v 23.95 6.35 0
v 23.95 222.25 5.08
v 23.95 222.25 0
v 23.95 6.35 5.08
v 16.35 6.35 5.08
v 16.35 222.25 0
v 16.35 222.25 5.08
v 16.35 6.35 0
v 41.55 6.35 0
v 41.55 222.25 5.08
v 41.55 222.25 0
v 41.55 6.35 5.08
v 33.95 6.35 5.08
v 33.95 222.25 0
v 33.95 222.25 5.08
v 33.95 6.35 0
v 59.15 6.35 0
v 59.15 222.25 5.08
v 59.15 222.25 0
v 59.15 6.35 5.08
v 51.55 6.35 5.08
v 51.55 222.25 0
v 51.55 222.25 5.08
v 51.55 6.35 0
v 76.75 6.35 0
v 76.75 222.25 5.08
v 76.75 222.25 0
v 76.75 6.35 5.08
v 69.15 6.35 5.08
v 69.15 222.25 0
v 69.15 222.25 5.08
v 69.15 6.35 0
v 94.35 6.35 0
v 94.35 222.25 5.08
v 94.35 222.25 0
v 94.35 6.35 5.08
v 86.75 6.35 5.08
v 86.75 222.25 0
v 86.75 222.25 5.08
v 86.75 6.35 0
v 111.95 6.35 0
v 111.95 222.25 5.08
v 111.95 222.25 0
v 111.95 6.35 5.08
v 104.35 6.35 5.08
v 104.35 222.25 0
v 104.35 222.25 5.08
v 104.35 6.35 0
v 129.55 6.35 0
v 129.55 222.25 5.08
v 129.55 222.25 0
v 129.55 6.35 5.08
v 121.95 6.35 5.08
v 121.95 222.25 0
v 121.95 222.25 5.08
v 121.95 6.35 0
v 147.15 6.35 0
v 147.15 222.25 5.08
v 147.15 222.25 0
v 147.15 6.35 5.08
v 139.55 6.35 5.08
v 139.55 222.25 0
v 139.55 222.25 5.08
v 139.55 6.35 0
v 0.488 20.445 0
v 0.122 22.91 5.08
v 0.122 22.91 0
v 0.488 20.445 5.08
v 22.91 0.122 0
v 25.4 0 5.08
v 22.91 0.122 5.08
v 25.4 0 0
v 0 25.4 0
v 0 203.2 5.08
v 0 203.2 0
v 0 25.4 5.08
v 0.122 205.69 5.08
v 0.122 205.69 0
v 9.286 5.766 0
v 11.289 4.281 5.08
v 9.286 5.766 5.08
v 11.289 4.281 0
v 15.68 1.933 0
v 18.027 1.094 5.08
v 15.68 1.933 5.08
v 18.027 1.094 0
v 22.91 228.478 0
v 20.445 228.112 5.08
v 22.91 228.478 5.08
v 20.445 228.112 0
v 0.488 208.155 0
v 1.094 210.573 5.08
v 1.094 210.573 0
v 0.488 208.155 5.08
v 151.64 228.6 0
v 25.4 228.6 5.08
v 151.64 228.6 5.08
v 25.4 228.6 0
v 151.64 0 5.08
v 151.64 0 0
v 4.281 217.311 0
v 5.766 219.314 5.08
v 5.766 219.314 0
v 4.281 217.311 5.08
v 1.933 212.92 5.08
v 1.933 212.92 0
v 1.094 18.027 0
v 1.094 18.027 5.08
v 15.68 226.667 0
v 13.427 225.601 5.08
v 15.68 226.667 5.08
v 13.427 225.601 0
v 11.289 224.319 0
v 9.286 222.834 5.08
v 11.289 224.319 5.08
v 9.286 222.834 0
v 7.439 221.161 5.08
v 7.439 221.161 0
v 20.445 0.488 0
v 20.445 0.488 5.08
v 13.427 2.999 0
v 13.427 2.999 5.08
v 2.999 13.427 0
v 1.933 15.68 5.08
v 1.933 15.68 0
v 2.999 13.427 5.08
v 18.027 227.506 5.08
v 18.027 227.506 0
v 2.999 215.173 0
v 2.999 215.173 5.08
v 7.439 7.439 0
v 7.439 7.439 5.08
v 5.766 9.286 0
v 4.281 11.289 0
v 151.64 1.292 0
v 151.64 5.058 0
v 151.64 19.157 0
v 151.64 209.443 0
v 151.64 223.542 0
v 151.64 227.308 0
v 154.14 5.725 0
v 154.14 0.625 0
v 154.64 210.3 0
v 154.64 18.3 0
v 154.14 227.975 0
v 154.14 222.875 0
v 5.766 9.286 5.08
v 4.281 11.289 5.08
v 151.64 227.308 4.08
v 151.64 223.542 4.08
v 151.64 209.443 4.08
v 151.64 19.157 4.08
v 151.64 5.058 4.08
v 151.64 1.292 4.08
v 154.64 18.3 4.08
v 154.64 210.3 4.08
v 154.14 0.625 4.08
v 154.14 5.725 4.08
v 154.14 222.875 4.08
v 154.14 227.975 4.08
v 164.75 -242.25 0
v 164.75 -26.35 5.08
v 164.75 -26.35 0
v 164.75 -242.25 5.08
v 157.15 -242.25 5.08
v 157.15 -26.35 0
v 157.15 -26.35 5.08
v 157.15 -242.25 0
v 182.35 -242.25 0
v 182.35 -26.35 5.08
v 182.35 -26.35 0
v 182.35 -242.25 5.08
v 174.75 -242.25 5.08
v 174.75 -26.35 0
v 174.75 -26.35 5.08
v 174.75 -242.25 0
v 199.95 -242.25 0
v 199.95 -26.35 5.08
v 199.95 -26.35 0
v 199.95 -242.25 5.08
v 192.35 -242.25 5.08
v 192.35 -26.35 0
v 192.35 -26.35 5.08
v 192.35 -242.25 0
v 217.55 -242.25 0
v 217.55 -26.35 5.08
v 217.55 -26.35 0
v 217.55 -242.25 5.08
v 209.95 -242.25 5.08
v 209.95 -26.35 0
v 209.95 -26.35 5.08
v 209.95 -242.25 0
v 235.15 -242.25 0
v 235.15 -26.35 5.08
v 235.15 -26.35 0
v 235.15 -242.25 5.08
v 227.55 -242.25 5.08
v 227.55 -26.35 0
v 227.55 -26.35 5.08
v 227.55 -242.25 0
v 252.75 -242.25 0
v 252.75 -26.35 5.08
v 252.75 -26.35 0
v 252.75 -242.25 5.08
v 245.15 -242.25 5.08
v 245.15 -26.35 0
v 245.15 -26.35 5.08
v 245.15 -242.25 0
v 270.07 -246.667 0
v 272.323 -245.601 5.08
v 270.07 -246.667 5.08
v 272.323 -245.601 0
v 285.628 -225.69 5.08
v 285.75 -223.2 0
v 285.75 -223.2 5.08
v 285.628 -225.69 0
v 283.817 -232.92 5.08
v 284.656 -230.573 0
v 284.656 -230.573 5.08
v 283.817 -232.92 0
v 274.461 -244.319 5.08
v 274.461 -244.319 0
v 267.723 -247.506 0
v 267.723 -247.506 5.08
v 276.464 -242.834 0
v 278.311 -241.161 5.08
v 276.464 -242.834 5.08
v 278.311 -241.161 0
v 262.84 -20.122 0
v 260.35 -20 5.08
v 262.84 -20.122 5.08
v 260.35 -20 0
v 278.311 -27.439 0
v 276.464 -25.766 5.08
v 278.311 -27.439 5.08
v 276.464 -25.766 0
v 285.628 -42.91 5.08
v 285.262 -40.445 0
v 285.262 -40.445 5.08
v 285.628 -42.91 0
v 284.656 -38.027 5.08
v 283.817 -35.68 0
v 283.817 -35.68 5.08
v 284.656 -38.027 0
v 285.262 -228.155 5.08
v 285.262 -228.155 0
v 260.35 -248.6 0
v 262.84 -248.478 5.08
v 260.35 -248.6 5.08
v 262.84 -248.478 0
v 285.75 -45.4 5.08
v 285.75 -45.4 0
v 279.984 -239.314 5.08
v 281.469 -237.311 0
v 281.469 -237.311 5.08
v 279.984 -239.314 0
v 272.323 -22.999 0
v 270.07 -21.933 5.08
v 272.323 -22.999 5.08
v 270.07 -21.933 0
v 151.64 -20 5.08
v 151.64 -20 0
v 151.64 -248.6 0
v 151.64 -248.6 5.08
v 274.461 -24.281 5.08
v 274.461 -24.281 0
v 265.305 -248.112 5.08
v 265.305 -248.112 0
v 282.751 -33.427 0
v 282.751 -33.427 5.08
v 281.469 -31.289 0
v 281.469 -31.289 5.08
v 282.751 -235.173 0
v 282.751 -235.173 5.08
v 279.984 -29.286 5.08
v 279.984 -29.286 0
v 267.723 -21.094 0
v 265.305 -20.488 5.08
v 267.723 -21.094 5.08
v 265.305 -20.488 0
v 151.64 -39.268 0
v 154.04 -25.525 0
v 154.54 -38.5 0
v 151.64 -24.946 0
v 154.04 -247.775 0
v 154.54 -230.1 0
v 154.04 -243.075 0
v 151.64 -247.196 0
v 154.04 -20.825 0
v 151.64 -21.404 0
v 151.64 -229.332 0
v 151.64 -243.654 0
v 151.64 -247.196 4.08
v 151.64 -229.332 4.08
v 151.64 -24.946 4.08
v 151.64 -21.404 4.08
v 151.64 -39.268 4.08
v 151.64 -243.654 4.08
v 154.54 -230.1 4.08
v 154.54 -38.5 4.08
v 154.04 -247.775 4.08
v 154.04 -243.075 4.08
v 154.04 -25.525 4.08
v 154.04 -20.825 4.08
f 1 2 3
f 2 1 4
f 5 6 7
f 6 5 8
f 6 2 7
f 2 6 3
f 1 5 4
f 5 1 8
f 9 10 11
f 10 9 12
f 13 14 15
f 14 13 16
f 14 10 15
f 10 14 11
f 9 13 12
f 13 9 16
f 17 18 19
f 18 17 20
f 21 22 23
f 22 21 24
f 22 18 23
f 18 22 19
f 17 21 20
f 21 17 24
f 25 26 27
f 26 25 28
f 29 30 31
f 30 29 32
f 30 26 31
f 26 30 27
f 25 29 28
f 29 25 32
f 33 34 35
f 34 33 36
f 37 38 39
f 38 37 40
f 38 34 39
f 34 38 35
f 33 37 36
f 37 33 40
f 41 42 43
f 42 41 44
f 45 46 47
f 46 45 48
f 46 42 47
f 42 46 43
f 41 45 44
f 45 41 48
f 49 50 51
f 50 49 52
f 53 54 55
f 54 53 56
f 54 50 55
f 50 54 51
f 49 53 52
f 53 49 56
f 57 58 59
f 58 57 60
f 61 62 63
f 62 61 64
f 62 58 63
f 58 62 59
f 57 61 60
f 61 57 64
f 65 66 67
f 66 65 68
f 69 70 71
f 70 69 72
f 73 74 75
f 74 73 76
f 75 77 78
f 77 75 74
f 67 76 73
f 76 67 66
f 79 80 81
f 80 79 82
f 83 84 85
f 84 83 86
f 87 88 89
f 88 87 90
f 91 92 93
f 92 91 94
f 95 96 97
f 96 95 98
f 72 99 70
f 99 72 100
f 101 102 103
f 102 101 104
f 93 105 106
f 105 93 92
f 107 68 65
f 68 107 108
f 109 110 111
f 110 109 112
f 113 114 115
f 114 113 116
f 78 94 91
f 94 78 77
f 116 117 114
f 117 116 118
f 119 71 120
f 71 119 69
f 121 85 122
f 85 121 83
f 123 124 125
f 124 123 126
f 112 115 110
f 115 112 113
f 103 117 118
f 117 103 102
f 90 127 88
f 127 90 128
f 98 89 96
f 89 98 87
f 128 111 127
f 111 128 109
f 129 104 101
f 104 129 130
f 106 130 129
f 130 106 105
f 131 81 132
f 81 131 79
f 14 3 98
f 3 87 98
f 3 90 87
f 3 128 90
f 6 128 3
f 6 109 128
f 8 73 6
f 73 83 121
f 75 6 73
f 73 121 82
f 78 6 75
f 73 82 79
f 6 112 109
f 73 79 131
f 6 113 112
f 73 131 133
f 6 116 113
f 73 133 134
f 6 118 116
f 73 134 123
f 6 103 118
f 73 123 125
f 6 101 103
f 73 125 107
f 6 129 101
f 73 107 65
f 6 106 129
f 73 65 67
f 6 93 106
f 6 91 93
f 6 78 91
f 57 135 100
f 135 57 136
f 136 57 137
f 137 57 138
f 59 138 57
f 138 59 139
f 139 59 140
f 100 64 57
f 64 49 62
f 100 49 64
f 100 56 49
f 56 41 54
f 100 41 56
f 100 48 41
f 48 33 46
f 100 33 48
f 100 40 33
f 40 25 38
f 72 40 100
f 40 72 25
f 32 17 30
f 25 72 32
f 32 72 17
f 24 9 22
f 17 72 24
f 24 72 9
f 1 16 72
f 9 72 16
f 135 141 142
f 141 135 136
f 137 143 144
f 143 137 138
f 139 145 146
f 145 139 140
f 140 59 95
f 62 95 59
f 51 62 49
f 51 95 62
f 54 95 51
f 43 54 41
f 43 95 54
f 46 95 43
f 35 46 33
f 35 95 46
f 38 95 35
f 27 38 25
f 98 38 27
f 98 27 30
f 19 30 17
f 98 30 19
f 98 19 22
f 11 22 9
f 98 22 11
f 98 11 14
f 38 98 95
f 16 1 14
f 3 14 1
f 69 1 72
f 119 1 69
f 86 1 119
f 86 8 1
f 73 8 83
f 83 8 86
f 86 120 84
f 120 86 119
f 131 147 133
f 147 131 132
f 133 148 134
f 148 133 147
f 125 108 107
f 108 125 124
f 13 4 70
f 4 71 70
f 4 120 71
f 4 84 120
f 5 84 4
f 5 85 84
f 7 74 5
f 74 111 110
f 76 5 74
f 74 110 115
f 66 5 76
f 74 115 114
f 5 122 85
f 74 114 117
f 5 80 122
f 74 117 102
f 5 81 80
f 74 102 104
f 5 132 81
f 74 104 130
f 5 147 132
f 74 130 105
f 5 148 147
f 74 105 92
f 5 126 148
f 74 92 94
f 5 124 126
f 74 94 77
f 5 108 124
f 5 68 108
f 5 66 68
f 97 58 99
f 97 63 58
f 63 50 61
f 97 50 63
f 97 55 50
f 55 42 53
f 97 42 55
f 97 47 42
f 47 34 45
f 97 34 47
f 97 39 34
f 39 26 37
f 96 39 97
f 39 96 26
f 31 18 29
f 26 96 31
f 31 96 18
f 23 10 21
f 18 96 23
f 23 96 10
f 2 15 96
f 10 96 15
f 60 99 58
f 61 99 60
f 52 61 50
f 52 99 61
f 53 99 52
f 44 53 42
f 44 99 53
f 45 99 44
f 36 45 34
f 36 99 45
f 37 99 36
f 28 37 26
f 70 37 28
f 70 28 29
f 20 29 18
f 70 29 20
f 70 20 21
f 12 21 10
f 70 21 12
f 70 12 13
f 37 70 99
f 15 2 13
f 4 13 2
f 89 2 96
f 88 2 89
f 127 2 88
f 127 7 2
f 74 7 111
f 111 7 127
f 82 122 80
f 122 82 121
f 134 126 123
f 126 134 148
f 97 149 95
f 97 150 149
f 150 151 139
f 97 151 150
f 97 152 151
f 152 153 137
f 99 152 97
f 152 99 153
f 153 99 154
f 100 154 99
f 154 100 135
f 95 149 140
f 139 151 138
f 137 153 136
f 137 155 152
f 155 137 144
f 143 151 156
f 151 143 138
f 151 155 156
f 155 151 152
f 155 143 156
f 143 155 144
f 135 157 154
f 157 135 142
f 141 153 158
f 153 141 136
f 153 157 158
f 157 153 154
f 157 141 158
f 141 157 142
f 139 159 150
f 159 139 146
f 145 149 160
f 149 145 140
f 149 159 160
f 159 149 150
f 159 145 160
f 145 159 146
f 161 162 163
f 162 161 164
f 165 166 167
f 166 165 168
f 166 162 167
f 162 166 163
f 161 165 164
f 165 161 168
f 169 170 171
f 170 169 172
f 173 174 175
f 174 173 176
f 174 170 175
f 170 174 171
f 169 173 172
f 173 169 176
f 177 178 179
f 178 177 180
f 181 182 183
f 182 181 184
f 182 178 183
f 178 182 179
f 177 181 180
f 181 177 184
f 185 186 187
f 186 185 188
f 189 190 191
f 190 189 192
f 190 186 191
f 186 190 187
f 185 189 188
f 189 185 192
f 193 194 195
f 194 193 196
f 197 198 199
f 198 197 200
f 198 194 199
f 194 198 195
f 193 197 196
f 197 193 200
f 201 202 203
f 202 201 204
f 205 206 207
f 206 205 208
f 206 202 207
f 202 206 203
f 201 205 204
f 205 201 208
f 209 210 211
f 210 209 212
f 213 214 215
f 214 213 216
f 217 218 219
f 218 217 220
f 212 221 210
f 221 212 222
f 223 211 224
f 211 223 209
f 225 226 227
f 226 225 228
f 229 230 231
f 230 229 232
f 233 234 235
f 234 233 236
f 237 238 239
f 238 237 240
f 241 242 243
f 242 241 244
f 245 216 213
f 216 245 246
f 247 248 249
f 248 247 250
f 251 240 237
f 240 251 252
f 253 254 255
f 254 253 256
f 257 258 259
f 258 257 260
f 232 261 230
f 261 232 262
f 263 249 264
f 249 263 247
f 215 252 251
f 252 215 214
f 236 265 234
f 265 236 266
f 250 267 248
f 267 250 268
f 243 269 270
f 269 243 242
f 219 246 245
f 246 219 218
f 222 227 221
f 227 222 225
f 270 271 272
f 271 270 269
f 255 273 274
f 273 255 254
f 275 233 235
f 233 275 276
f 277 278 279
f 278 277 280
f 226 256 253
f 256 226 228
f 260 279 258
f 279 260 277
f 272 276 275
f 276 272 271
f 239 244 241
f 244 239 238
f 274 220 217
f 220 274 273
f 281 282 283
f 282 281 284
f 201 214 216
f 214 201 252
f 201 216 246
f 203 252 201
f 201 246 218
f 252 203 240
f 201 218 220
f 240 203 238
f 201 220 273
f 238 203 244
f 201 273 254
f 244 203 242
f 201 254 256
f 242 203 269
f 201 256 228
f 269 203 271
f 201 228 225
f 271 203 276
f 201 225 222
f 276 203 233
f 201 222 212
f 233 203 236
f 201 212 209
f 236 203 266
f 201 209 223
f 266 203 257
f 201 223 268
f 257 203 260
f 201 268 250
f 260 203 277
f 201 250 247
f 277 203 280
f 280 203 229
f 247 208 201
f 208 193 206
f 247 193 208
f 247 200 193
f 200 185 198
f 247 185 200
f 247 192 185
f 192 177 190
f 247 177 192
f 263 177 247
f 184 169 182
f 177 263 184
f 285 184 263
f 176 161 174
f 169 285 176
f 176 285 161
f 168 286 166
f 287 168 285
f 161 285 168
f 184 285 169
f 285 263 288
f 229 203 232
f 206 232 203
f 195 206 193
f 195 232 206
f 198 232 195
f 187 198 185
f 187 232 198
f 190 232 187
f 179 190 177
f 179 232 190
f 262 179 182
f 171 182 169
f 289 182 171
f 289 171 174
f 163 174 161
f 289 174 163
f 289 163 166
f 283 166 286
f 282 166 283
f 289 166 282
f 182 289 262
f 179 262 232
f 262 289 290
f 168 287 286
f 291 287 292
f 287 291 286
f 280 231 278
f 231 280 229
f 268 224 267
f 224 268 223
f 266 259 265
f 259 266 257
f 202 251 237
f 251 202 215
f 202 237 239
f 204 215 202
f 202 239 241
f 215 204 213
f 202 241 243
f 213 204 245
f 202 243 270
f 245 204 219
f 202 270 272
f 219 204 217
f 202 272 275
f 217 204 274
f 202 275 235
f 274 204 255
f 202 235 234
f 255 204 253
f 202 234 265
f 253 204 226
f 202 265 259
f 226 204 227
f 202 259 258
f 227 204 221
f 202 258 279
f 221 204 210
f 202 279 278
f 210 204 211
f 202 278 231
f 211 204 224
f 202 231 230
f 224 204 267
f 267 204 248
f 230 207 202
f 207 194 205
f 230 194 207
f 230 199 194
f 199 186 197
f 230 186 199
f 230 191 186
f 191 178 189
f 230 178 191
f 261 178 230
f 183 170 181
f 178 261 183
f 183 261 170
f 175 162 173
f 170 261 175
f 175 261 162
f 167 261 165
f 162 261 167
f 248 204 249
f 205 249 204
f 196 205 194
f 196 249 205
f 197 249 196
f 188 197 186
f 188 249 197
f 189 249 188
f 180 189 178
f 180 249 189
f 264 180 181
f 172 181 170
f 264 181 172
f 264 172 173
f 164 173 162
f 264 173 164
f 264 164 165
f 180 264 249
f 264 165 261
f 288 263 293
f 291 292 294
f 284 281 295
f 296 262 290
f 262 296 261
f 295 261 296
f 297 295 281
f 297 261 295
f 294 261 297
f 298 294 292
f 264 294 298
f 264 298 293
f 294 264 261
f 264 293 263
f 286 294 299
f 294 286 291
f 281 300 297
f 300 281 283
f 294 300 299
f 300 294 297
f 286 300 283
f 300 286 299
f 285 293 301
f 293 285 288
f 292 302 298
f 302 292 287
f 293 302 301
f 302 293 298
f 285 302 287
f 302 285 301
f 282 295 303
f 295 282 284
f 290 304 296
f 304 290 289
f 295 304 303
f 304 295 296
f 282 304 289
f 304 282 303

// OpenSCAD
// file: model-forge/model-forge/tray.scad
// model-forge/tray.scad — rounded-corner outer panel with a recessed
// inset pocket (e.g. a "cooking dish" recess): a raised rim around the
// edge, floor thickness under the pocket, and an optional thin lip
// flange around the base — sized to slide into a support-rail groove
// (like the wooden rails inside the real Tiny Land oven cavity) rather
// than just resting loose.
//
//   use <model-forge/tray.scad>
//   rounded_tray(outer_width=285.75, outer_height=228.6, corner_radius=25.4,
//                floor_thickness=5.08, rim_height=3.81, inset_margin=6.35,
//                lip_width=3, lip_thickness=2);
//
// Shape: outer_width x outer_height slab, rounded corners (corner_radius),
// total height = floor_thickness + rim_height. A pocket is cut from the
// top, inset_margin in from every edge, cutting down through rim_height
// and stopping at floor_thickness from the bottom — so floor_thickness is
// what's left under the pocket, rim_height is how tall the surrounding
// wall stands above the pocket floor.
//
// The lip (lip_width/lip_thickness) is a thin flange at the TOP of the
// rim (from total_height-lip_thickness to total_height), sticking out
// lip_width beyond the main body on every side — corrected 2026-09-11
// per feedback on the real rail photo: the groove is near the top of the
// cavity wall, not the bottom. Both default to 0 (no lip) so existing
// calls keep working unchanged.

// hull-of-4-circles rounded rect — much faster to render than a
// minkowski-based approach for this shape (no minkowski sum needed).
module rounded_rect_2d(w, h, r) {
  hull() {
    translate([r, r]) circle(r = r, $fn = 64);
    translate([w - r, r]) circle(r = r, $fn = 64);
    translate([r, h - r]) circle(r = r, $fn = 64);
    translate([w - r, h - r]) circle(r = r, $fn = 64);
  }
}

module rounded_tray(
  outer_width,
  outer_height,
  corner_radius,
  floor_thickness,
  rim_height,
  inset_margin,
  lip_width = 0,
  lip_thickness = 0
) {
  total_height = floor_thickness + rim_height;

  union() {
    if (lip_width > 0 && lip_thickness > 0) {
      translate([-lip_width, -lip_width, total_height - lip_thickness])
        linear_extrude(height = lip_thickness)
          rounded_rect_2d(outer_width + 2 * lip_width, outer_height + 2 * lip_width, corner_radius + lip_width);
    }
    difference() {
      linear_extrude(height = total_height)
        rounded_rect_2d(outer_width, outer_height, corner_radius);
      translate([inset_margin, inset_margin, floor_thickness])
        cube([outer_width - 2 * inset_margin, outer_height - 2 * inset_margin, rim_height + 1]);
    }
  }
}
// file: model-forge/joint.scad
// model-forge/joint.scad — dovetail finger-joint tabs for snap-fit panel
// segmentation. One segment gets protruding tabs (union onto its edge),
// the matching segment gets slightly-larger slots (difference cut into
// its edge) so the two press together with a light interference/snap fit.
//
// Both modules produce a 2D profile running along the X axis, centered
// on the boundary line (y=0), for a boundary of the given edge_length.
// The caller extrudes and positions/rotates it onto the actual seam
// (see back-wall-joint-test.scad for a worked example on a vertical seam).
//
//   use <model-forge/joint.scad>
//   linear_extrude(height=thickness)
//     dovetail_tabs_2d(edge_length=60, tab_width=15, tab_depth=6, taper=2);
//   // on the MATING piece, subtract:
//   linear_extrude(height=thickness+2)
//     dovetail_tabs_2d(edge_length=60, tab_width=15, tab_depth=6, taper=2, clearance=0.15);

module dovetail_tab_2d(tab_width, tab_depth, taper, base_overlap = 0.5) {
  // Trapezoid: narrow at the base, wider at the tip (y=tab_depth) — the
  // taper is what makes it a dovetail (can't pull straight out sideways
  // once the mating slot is filled) and gives the snap/interference feel
  // as it's pressed in along Y. The base extends base_overlap PAST y=0
  // (the seam line) on purpose: a cut/union placed exactly flush with a
  // piece's boundary face (zero overlap) is a classic OpenSCAD/CGAL
  // gotcha — coincident faces produce degenerate, non-manifold results
  // (confirmed here: without the overlap this rendered as a distorted
  // sliver instead of a clean notch). The overlap guarantees real overlap
  // for both the union (tab) and difference (slot) uses.
  polygon(points = [
    [-tab_width / 2, -base_overlap],
    [tab_width / 2, -base_overlap],
    [tab_width / 2 + taper, tab_depth],
    [-tab_width / 2 - taper, tab_depth],
  ]);
}

/**
 * A row of dovetail tabs spanning edge_length, evenly spaced and centered,
 * each tab_width wide with tab_depth of protrusion and the given taper.
 * Pass clearance > 0 (e.g. 0.15-0.2mm) when using this as a SLOT cutout on
 * the mating piece, so the tab has just enough room to press in.
 */
module dovetail_tabs_2d(edge_length, tab_width, tab_depth, taper, clearance = 0) {
  // Growing the slot via offset(delta=clearance) produced a disconnected
  // sliver fragment at the corner (confirmed with --render: 3 volumes
  // instead of 2, a known OpenSCAD quirk with delta-mode offset on a
  // trapezoid). Scaling the tab's own dimensions directly instead avoids
  // offset() entirely and renders as the expected 2 volumes.
  pitch = tab_width * 2;
  n = max(1, floor(edge_length / pitch));
  row_width = n * pitch - tab_width;
  start_x = -row_width / 2;
  for (i = [0 : n - 1]) {
    translate([start_x + i * pitch, 0])
      dovetail_tab_2d(tab_width + 2 * clearance, tab_depth + clearance, taper + clearance);
  }
}
// file: model-forge/grate.scad
// model-forge/grate.scad — rounded-corner panel cut into an oven-rack-
// style bar grate: a solid frame border, parallel bars across the
// interior with open gaps between them.
//
//   use <model-forge/grate.scad>
//   oven_grate(outer_width=285.75, outer_height=228.6, corner_radius=25.4,
//              thickness=5.08, frame_width=6.35, bar_width=10, gap_width=7.6);
//
// Bars run parallel to the height (vertical bars spanning the width),
// starting and ending with a solid bar against the frame — real oven
// racks don't have a gap right at the edge. Spacing is pitch-based
// (bar_width + gap_width repeating); it won't divide the interior
// perfectly evenly on every size, so the last bar absorbs any leftover
// width. Tune bar_width/gap_width and re-render if that's visible.
use <model-forge/tray.scad> // rounded_rect_2d

module oven_grate(outer_width, outer_height, corner_radius, thickness, frame_width, bar_width, gap_width) {
  inner_width = outer_width - 2 * frame_width;
  inner_height = outer_height - 2 * frame_width;
  pitch = bar_width + gap_width;
  n_gaps = floor((inner_width - bar_width) / pitch);

  difference() {
    linear_extrude(height = thickness)
      rounded_rect_2d(outer_width, outer_height, corner_radius);
    for (i = [0 : n_gaps - 1]) {
      x = frame_width + bar_width + i * pitch;
      translate([x, frame_width, -1])
        cube([gap_width, inner_height, thickness + 2]);
    }
  }
}
// main file
// Tiny Land oven grate v3b — "oven grate half": the 2-part comparison
// piece. Same cut-the-real-shape principle as oven-grate-separated.scad
// (calls oven_grate() directly, untouched), but a single seam right
// down the middle instead of 2 seams near the edges.
//
// Cut at bar 9's center (151.64mm) -- the bar closest to the true
// center (142.875mm, which falls in a gap, same distance from bar 8 as
// bar 9). Same lesson as the 3-part fix: cut THROUGH a bar's own body,
// not a gap, so there's continuous material for the joint.
//
// "2-fold" redundant joint per direct request: one large dovetail
// through the bar's own body (main structural connection) PLUS two
// smaller dovetails in the top and bottom frame bands (which run
// continuously regardless of x-position) -- three separate connection
// points spread across the height at the one seam, for twist
// resistance, not just one big one.
//
// This seam sits at the point of PEAK bending moment for a
// center-loaded, both-ends-supported shelf (unlike oven-grate-
// separated.scad's 2 seams, which sit near the supports where moment
// is near zero) -- structurally the worse location for a joint in
// theory. Printing both to compare for real.
use <model-forge/grate.scad>
use <model-forge/joint.scad>

/* [Size — inches] */
outer_width_in  = 11.25;
outer_height_in = 9;
corner_radius_in = 1;

/* [Bars] */
thickness_mm   = 5.08;
frame_width_mm = 6.35;
bar_width_mm   = 10;
gap_width_mm   = 7.6;

/* [Lip — docks into the oven cavity's support rail] */
lip_width_in     = 0.12;
end_lip_width_in = 0.5;
lip_thickness_mm = 2.5;

/* [Main seam joint — through the bar's own body] */
main_tenon_width = 190;
main_tenon_depth = 3;
main_tenon_taper = 1;

/* [Frame-band joints — smaller scale, fits inside the 6.35mm band] */
band_tenon_width = 3.5;
band_tenon_depth = 2.5;
band_tenon_taper = 0.8;

seam_clearance  = -0.1;  // validated winning value
floor_thickness = 1;     // matches the bar/rail mortise floor elsewhere

IN_TO_MM = 25.4;
outer_w = outer_width_in * IN_TO_MM;
outer_h = outer_height_in * IN_TO_MM;
cut_x = 151.64; // bar 9's center — see header comment
tenon_h = thickness_mm - floor_thickness;
BIG = 1000;

module full_grate() {
  oven_grate(
    outer_width   = outer_w,
    outer_height  = outer_h,
    corner_radius = corner_radius_in * IN_TO_MM,
    thickness     = thickness_mm,
    frame_width   = frame_width_mm,
    bar_width     = bar_width_mm,
    gap_width     = gap_width_mm,
    lip_width     = lip_width_in * IN_TO_MM,
    end_lip_width = end_lip_width_in * IN_TO_MM,
    lip_thickness = lip_thickness_mm
  );
}

module tab_at(y_center, width, depth, taper) {
  translate([cut_x, y_center, 0])
    rotate([0, 0, -90])
      linear_extrude(height = tenon_h)
        dovetail_tab_2d(width, depth, taper);
}

module slot_at(y_center, width, depth, taper) {
  translate([cut_x, y_center, -1])
    rotate([0, 0, -90])
      linear_extrude(height = tenon_h + 1)
        dovetail_tab_2d(
          width + 2 * seam_clearance,
          depth + seam_clearance,
          taper + seam_clearance
        );
}

module left_half() {
  union() {
    intersection() {
      full_grate();
      translate([-BIG, -BIG, -1])
        cube([BIG + cut_x, outer_h + 2 * BIG, thickness_mm + 2]);
    }
    tab_at(outer_h / 2, main_tenon_width, main_tenon_depth, main_tenon_taper);
    tab_at(frame_width_mm / 2, band_tenon_width, band_tenon_depth, band_tenon_taper);
    tab_at(outer_h - frame_width_mm / 2, band_tenon_width, band_tenon_depth, band_tenon_taper);
  }
}

module right_half() {
  difference() {
    intersection() {
      full_grate();
      translate([cut_x, -BIG, -1])
        cube([outer_w - cut_x + BIG, outer_h + 2 * BIG, thickness_mm + 2]);
    }
    slot_at(outer_h / 2, main_tenon_width, main_tenon_depth, main_tenon_taper);
    slot_at(frame_width_mm / 2, band_tenon_width, band_tenon_depth, band_tenon_taper);
    slot_at(outer_h - frame_width_mm / 2, band_tenon_width, band_tenon_depth, band_tenon_taper);
  }
}

left_half();
translate([0, -(outer_h + 20), 0]) right_half();
